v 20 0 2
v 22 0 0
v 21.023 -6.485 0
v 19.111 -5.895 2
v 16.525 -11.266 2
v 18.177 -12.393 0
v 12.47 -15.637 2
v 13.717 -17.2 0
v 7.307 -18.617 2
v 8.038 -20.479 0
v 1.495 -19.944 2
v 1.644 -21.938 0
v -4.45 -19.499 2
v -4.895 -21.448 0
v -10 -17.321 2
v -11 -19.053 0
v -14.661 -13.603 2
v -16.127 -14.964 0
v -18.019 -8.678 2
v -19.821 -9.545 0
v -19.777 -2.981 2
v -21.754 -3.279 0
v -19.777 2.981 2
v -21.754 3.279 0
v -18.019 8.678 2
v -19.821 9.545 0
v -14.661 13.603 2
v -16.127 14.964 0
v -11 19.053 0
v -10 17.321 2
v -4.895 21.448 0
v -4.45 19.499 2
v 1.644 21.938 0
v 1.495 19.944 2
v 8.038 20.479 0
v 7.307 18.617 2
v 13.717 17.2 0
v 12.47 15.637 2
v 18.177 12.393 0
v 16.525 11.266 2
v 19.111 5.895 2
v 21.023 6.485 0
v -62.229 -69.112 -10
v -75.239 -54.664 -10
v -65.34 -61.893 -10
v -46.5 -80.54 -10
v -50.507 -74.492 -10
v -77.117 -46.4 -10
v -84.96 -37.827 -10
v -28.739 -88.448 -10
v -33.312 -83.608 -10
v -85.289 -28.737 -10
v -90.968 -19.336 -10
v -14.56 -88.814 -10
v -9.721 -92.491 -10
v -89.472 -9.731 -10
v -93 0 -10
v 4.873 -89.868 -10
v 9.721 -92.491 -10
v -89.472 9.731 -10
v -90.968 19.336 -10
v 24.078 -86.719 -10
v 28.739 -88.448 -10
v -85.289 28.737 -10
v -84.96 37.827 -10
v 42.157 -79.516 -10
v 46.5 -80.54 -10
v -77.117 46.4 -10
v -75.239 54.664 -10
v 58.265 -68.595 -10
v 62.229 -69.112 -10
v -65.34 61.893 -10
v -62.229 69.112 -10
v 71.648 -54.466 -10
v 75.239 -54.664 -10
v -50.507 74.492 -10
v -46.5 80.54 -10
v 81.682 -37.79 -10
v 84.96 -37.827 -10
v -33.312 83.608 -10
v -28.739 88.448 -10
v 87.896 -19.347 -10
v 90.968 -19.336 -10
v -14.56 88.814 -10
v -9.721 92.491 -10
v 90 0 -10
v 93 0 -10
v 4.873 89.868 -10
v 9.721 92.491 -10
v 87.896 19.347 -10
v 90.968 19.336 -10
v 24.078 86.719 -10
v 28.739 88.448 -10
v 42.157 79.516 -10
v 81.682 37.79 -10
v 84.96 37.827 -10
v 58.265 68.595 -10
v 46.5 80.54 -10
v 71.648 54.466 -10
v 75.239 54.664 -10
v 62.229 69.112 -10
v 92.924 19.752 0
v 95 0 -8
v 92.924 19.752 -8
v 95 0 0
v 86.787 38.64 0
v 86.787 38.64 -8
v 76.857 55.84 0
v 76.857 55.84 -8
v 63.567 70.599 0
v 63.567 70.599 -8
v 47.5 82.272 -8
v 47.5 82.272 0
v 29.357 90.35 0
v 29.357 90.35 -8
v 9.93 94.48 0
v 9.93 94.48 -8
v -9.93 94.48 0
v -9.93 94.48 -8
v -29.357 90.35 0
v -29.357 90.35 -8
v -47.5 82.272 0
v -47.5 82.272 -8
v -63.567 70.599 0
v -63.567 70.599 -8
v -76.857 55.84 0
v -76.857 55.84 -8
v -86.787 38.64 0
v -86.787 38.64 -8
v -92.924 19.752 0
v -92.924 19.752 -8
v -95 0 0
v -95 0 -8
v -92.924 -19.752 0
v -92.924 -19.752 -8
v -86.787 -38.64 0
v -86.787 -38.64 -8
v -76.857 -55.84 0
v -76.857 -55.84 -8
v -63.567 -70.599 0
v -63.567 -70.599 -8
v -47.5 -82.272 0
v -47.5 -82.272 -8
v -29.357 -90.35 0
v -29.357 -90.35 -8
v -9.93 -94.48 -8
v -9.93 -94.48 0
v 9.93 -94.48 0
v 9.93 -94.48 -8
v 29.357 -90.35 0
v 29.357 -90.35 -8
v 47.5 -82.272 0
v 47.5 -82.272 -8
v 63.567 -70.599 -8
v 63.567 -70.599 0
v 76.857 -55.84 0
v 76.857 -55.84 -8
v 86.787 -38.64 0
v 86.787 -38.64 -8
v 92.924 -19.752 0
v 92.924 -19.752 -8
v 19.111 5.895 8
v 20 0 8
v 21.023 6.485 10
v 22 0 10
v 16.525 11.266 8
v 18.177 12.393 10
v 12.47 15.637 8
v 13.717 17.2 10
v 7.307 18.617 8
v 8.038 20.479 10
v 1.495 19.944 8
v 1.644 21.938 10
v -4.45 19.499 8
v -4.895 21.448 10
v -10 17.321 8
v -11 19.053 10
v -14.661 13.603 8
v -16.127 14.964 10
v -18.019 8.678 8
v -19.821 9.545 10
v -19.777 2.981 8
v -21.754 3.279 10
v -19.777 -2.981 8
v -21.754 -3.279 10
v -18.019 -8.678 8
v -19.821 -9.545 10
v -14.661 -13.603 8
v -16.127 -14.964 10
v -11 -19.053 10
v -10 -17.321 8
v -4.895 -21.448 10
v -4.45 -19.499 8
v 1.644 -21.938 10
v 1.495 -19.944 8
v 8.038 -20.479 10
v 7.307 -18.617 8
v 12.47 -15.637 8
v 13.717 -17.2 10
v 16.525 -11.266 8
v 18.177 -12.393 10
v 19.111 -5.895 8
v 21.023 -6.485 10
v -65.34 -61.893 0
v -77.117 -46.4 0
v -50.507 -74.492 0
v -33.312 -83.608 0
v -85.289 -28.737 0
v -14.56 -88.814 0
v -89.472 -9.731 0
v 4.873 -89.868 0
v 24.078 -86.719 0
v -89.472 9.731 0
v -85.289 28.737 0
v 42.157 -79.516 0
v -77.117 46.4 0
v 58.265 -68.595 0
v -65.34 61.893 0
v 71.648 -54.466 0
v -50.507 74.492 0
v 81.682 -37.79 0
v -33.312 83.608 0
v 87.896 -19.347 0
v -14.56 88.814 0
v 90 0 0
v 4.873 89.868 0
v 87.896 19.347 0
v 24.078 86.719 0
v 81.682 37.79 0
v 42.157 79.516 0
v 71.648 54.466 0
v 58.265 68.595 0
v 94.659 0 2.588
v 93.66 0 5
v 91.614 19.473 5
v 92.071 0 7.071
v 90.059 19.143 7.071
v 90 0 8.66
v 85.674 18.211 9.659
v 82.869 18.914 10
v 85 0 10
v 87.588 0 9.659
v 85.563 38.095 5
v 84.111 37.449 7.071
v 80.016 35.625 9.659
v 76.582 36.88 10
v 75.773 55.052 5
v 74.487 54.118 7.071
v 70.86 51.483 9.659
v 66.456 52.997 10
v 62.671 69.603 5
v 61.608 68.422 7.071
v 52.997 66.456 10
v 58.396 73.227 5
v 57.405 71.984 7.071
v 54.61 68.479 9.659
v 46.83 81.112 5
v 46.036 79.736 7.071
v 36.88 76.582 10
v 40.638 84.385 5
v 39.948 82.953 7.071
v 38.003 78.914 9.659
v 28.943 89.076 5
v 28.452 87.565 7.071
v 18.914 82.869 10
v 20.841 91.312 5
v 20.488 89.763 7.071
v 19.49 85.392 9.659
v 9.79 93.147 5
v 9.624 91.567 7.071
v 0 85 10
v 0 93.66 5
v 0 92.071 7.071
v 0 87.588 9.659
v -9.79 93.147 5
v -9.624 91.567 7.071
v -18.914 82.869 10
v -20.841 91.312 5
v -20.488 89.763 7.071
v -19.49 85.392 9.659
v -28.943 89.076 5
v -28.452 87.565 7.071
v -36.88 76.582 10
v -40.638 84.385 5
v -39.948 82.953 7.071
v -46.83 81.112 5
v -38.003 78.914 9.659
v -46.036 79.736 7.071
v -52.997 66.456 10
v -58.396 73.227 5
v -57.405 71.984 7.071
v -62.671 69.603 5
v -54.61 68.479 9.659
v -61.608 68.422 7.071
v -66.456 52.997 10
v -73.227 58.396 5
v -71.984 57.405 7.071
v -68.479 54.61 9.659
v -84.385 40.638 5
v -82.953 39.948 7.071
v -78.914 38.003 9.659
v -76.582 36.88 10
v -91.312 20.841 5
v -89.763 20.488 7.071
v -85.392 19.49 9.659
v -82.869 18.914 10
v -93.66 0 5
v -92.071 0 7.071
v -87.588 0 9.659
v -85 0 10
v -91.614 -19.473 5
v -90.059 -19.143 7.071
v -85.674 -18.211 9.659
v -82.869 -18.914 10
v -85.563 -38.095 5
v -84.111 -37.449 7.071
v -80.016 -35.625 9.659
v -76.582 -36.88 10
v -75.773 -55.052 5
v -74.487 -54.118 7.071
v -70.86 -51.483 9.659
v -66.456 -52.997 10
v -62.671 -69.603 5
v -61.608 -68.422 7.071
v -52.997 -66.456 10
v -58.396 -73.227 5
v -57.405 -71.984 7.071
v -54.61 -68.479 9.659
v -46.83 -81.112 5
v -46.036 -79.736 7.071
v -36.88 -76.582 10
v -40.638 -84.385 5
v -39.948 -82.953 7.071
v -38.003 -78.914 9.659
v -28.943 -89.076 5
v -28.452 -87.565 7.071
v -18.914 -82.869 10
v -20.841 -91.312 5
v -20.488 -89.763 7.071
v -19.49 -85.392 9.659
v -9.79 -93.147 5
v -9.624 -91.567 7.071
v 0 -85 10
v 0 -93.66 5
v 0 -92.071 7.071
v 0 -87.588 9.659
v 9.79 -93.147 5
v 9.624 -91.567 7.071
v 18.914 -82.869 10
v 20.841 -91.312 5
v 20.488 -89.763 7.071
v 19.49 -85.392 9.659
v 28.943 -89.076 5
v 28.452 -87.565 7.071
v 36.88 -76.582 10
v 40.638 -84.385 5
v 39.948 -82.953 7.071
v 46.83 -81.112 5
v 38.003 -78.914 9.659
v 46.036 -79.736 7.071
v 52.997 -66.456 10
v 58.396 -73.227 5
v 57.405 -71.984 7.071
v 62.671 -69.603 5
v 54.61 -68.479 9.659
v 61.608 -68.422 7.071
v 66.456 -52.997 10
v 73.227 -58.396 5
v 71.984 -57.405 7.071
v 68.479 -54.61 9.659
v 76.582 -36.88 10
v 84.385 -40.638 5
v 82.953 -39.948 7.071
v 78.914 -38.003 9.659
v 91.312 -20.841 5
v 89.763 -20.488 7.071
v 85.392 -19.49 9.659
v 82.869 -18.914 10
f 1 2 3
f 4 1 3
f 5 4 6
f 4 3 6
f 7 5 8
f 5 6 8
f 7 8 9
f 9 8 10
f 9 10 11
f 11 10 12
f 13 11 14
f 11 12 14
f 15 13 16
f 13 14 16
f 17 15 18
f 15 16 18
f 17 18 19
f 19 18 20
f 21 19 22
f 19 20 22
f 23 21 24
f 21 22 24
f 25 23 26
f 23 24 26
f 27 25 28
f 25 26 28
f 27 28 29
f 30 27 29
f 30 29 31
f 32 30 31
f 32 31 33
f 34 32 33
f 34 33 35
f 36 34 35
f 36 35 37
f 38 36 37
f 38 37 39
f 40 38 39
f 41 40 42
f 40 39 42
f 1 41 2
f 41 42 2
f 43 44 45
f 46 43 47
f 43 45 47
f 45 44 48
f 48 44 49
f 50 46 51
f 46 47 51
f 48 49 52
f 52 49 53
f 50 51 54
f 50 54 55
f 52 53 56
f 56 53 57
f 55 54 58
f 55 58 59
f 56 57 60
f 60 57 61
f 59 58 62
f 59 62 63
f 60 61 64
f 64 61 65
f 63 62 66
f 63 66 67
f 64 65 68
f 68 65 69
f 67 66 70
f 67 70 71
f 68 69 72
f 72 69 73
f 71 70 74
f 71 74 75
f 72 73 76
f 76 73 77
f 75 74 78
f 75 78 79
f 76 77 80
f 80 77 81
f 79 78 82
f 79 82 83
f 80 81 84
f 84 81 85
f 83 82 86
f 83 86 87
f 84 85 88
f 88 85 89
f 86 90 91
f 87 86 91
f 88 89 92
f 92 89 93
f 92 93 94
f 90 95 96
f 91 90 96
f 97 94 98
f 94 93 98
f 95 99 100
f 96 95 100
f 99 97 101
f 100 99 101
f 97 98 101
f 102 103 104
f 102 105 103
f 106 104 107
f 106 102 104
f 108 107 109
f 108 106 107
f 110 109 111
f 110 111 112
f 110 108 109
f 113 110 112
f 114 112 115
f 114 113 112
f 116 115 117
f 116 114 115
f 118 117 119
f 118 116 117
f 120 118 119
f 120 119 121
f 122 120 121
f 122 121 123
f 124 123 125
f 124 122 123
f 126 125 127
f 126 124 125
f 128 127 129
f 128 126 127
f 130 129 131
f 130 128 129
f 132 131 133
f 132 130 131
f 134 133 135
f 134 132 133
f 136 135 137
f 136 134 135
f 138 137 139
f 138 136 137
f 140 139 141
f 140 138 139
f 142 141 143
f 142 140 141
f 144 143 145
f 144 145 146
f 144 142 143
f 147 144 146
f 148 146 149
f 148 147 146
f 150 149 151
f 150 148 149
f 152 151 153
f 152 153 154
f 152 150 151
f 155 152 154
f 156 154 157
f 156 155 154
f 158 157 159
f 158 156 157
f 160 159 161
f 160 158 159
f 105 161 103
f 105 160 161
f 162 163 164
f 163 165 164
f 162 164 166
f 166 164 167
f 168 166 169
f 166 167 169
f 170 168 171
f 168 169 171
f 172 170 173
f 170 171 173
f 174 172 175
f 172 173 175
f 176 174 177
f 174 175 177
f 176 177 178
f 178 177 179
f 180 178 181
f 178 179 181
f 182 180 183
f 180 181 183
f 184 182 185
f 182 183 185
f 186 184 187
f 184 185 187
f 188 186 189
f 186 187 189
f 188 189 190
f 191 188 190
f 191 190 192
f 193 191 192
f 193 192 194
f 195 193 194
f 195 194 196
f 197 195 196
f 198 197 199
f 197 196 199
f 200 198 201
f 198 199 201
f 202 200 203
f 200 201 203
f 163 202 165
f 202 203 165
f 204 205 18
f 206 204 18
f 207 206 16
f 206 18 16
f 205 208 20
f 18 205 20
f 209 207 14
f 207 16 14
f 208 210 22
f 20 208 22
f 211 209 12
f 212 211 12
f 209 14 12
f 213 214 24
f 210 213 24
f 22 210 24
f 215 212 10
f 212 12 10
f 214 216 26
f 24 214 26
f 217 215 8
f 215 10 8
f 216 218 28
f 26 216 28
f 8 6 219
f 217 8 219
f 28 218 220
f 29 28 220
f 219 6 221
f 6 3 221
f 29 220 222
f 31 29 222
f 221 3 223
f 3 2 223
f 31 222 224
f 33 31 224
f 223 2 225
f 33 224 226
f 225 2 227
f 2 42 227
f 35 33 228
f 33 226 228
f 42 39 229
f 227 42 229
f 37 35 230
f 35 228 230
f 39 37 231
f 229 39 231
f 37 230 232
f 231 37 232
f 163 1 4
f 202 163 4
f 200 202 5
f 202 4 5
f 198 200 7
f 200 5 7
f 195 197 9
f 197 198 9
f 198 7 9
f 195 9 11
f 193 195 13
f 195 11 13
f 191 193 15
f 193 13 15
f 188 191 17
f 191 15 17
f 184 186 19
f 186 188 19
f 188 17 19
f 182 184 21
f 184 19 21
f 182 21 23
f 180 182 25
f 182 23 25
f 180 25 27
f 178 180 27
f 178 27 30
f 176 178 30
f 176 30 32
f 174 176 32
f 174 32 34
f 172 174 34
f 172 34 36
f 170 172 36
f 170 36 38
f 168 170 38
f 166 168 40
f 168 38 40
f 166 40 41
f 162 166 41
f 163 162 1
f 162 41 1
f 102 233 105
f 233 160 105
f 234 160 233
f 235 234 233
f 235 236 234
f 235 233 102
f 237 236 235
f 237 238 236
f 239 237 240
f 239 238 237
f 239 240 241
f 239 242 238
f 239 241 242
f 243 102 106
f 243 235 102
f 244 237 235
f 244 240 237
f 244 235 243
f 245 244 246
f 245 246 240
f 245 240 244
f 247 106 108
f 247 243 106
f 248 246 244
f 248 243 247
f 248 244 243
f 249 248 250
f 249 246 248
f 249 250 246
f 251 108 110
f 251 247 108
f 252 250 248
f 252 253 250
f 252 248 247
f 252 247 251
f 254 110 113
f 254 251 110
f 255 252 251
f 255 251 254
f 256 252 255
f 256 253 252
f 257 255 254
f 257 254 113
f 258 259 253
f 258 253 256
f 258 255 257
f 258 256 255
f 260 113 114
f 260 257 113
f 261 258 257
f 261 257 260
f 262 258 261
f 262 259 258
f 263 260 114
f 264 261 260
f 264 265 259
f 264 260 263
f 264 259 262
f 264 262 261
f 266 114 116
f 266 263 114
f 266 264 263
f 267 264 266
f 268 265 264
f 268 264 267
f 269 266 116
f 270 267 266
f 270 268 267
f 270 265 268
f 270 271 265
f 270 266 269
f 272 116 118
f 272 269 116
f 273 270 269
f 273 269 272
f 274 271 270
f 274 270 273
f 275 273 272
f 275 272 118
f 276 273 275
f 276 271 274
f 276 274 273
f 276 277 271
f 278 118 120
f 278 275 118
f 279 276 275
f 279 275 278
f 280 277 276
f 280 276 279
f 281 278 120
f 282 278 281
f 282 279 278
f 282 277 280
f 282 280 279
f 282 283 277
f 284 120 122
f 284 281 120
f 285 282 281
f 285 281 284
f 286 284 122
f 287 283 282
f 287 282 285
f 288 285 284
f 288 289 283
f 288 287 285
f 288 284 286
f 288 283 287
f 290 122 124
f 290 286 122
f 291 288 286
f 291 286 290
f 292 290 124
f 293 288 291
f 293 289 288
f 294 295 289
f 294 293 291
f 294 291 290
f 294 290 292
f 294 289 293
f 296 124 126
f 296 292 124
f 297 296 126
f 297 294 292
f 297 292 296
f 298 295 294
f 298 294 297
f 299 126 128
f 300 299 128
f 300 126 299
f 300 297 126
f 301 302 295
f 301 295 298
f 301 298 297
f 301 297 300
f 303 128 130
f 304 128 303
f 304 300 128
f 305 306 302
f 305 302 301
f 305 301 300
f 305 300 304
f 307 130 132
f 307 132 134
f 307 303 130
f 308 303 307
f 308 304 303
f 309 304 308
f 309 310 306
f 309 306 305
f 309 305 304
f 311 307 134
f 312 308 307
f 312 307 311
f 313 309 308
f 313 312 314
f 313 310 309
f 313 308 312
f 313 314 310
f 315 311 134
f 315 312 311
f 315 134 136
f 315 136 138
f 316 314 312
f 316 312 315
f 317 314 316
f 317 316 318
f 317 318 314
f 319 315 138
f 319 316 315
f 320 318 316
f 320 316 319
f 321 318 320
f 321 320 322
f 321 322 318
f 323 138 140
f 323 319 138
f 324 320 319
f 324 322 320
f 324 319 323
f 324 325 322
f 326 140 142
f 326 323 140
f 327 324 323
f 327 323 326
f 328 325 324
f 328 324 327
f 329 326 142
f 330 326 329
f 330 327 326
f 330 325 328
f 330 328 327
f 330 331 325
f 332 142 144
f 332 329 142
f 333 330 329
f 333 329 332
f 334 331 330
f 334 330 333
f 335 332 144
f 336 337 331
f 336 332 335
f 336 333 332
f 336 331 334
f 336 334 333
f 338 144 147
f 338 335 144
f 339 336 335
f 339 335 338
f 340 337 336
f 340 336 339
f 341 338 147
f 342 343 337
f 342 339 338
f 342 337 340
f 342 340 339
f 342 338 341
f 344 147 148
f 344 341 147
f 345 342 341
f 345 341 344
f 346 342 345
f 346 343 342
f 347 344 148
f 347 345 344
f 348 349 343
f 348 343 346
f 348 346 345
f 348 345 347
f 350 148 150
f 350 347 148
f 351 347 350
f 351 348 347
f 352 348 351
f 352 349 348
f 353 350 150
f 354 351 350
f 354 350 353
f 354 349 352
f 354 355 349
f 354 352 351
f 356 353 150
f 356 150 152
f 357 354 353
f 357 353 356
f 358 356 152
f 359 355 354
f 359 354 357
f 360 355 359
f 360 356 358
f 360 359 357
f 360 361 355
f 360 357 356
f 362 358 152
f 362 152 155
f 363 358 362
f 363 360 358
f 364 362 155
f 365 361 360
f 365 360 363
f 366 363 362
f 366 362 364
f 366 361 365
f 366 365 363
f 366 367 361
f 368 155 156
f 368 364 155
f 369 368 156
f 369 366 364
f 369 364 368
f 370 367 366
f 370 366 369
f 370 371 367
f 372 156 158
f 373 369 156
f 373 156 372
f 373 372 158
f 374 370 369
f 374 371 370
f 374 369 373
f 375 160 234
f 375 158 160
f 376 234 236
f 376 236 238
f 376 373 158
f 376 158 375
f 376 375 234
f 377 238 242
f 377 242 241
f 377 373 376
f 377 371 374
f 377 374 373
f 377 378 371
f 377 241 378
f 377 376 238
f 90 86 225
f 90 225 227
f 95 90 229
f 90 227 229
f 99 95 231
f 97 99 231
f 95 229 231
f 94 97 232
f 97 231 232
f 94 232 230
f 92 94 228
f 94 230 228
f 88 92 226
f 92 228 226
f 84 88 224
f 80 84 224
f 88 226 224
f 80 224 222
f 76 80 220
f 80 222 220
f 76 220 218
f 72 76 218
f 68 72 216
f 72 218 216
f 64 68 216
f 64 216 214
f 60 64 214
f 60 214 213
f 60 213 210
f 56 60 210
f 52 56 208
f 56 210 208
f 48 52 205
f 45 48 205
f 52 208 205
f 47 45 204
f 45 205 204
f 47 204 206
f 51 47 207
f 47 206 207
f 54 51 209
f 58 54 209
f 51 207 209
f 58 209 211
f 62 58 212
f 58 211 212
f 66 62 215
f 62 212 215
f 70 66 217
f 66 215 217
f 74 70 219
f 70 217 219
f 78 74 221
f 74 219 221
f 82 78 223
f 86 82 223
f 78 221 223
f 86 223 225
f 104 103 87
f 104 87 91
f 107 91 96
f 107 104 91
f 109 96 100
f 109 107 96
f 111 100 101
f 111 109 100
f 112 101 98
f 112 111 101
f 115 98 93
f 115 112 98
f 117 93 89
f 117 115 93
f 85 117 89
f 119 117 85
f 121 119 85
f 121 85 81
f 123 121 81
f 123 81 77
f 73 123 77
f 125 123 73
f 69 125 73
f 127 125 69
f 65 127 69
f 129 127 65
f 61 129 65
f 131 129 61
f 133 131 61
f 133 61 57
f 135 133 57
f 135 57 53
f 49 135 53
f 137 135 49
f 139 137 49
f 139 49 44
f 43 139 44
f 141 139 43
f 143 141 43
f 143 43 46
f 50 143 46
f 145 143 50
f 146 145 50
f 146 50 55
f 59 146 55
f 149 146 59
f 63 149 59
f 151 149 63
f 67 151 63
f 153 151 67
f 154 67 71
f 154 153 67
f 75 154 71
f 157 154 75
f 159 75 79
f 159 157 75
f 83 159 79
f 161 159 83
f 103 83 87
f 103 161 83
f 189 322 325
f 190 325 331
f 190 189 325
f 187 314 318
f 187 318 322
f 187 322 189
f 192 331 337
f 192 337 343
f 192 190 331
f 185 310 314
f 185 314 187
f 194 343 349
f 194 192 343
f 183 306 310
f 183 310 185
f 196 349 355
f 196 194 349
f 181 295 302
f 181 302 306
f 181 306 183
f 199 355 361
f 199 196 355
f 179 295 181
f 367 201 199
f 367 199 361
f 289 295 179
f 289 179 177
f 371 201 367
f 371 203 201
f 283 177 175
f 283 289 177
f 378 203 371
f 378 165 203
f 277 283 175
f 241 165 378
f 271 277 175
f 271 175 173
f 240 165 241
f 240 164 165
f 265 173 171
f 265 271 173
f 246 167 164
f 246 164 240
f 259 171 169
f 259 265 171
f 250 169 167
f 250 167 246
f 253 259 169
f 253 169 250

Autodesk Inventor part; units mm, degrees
ref_plane "YZ Plane" through (0, 0, 0) normal (1, 0, 0) x (0, 1, 0)
ref_plane "XZ Plane" through (0, 0, 0) normal (0, 1, 0) x (-1, 0, 0)
ref_plane "XY Plane" through (0, 0, 0) normal (0, 0, 1) x (1, 0, 0)
sketch "Szkic1" plane through (0, 0, 0) normal (0, 0, 1) x (1, 0, 0)
  circle A0 centre (0, 0) radius 90 projected
  circle A1 centre (0, 0) radius 90
  circle A2 centre (0, 0) radius 95
  point P0 (0, 0)
  dimension "d0" = 190
extrude "Wyciągnięcie proste1" add sketch "Szkic1" against normal blind 10
ref_plane "Płaszczyzna konstrukcyjna1" through (0, 0, 0) normal (0, 0, 1) x (1, 0, 0)
sketch "Szkic2" plane through (0, 0, 0) normal (0, 0, 1) x (1, 0, 0)
  circle A0 centre (0, 0) radius 95
  circle A1 centre (0, 0) radius 20
  dimension "d3" = 40
extrude "Wyciągnięcie proste2" add sketch "Szkic2" along normal blind 10
fillet "Zaokrąglenie1" radius 10 1 edges at (-95, 0, 10)
chamfer "Faza1" distance 2 angle 45 1 edges at (-95, 0, -10)
chamfer "Faza2" distance 2 angle 45 2 edges at (-20, 0, 0) (-20, 0, 10)
properties part number "dekieltop" material "PCW, nieplastyfikowany"
